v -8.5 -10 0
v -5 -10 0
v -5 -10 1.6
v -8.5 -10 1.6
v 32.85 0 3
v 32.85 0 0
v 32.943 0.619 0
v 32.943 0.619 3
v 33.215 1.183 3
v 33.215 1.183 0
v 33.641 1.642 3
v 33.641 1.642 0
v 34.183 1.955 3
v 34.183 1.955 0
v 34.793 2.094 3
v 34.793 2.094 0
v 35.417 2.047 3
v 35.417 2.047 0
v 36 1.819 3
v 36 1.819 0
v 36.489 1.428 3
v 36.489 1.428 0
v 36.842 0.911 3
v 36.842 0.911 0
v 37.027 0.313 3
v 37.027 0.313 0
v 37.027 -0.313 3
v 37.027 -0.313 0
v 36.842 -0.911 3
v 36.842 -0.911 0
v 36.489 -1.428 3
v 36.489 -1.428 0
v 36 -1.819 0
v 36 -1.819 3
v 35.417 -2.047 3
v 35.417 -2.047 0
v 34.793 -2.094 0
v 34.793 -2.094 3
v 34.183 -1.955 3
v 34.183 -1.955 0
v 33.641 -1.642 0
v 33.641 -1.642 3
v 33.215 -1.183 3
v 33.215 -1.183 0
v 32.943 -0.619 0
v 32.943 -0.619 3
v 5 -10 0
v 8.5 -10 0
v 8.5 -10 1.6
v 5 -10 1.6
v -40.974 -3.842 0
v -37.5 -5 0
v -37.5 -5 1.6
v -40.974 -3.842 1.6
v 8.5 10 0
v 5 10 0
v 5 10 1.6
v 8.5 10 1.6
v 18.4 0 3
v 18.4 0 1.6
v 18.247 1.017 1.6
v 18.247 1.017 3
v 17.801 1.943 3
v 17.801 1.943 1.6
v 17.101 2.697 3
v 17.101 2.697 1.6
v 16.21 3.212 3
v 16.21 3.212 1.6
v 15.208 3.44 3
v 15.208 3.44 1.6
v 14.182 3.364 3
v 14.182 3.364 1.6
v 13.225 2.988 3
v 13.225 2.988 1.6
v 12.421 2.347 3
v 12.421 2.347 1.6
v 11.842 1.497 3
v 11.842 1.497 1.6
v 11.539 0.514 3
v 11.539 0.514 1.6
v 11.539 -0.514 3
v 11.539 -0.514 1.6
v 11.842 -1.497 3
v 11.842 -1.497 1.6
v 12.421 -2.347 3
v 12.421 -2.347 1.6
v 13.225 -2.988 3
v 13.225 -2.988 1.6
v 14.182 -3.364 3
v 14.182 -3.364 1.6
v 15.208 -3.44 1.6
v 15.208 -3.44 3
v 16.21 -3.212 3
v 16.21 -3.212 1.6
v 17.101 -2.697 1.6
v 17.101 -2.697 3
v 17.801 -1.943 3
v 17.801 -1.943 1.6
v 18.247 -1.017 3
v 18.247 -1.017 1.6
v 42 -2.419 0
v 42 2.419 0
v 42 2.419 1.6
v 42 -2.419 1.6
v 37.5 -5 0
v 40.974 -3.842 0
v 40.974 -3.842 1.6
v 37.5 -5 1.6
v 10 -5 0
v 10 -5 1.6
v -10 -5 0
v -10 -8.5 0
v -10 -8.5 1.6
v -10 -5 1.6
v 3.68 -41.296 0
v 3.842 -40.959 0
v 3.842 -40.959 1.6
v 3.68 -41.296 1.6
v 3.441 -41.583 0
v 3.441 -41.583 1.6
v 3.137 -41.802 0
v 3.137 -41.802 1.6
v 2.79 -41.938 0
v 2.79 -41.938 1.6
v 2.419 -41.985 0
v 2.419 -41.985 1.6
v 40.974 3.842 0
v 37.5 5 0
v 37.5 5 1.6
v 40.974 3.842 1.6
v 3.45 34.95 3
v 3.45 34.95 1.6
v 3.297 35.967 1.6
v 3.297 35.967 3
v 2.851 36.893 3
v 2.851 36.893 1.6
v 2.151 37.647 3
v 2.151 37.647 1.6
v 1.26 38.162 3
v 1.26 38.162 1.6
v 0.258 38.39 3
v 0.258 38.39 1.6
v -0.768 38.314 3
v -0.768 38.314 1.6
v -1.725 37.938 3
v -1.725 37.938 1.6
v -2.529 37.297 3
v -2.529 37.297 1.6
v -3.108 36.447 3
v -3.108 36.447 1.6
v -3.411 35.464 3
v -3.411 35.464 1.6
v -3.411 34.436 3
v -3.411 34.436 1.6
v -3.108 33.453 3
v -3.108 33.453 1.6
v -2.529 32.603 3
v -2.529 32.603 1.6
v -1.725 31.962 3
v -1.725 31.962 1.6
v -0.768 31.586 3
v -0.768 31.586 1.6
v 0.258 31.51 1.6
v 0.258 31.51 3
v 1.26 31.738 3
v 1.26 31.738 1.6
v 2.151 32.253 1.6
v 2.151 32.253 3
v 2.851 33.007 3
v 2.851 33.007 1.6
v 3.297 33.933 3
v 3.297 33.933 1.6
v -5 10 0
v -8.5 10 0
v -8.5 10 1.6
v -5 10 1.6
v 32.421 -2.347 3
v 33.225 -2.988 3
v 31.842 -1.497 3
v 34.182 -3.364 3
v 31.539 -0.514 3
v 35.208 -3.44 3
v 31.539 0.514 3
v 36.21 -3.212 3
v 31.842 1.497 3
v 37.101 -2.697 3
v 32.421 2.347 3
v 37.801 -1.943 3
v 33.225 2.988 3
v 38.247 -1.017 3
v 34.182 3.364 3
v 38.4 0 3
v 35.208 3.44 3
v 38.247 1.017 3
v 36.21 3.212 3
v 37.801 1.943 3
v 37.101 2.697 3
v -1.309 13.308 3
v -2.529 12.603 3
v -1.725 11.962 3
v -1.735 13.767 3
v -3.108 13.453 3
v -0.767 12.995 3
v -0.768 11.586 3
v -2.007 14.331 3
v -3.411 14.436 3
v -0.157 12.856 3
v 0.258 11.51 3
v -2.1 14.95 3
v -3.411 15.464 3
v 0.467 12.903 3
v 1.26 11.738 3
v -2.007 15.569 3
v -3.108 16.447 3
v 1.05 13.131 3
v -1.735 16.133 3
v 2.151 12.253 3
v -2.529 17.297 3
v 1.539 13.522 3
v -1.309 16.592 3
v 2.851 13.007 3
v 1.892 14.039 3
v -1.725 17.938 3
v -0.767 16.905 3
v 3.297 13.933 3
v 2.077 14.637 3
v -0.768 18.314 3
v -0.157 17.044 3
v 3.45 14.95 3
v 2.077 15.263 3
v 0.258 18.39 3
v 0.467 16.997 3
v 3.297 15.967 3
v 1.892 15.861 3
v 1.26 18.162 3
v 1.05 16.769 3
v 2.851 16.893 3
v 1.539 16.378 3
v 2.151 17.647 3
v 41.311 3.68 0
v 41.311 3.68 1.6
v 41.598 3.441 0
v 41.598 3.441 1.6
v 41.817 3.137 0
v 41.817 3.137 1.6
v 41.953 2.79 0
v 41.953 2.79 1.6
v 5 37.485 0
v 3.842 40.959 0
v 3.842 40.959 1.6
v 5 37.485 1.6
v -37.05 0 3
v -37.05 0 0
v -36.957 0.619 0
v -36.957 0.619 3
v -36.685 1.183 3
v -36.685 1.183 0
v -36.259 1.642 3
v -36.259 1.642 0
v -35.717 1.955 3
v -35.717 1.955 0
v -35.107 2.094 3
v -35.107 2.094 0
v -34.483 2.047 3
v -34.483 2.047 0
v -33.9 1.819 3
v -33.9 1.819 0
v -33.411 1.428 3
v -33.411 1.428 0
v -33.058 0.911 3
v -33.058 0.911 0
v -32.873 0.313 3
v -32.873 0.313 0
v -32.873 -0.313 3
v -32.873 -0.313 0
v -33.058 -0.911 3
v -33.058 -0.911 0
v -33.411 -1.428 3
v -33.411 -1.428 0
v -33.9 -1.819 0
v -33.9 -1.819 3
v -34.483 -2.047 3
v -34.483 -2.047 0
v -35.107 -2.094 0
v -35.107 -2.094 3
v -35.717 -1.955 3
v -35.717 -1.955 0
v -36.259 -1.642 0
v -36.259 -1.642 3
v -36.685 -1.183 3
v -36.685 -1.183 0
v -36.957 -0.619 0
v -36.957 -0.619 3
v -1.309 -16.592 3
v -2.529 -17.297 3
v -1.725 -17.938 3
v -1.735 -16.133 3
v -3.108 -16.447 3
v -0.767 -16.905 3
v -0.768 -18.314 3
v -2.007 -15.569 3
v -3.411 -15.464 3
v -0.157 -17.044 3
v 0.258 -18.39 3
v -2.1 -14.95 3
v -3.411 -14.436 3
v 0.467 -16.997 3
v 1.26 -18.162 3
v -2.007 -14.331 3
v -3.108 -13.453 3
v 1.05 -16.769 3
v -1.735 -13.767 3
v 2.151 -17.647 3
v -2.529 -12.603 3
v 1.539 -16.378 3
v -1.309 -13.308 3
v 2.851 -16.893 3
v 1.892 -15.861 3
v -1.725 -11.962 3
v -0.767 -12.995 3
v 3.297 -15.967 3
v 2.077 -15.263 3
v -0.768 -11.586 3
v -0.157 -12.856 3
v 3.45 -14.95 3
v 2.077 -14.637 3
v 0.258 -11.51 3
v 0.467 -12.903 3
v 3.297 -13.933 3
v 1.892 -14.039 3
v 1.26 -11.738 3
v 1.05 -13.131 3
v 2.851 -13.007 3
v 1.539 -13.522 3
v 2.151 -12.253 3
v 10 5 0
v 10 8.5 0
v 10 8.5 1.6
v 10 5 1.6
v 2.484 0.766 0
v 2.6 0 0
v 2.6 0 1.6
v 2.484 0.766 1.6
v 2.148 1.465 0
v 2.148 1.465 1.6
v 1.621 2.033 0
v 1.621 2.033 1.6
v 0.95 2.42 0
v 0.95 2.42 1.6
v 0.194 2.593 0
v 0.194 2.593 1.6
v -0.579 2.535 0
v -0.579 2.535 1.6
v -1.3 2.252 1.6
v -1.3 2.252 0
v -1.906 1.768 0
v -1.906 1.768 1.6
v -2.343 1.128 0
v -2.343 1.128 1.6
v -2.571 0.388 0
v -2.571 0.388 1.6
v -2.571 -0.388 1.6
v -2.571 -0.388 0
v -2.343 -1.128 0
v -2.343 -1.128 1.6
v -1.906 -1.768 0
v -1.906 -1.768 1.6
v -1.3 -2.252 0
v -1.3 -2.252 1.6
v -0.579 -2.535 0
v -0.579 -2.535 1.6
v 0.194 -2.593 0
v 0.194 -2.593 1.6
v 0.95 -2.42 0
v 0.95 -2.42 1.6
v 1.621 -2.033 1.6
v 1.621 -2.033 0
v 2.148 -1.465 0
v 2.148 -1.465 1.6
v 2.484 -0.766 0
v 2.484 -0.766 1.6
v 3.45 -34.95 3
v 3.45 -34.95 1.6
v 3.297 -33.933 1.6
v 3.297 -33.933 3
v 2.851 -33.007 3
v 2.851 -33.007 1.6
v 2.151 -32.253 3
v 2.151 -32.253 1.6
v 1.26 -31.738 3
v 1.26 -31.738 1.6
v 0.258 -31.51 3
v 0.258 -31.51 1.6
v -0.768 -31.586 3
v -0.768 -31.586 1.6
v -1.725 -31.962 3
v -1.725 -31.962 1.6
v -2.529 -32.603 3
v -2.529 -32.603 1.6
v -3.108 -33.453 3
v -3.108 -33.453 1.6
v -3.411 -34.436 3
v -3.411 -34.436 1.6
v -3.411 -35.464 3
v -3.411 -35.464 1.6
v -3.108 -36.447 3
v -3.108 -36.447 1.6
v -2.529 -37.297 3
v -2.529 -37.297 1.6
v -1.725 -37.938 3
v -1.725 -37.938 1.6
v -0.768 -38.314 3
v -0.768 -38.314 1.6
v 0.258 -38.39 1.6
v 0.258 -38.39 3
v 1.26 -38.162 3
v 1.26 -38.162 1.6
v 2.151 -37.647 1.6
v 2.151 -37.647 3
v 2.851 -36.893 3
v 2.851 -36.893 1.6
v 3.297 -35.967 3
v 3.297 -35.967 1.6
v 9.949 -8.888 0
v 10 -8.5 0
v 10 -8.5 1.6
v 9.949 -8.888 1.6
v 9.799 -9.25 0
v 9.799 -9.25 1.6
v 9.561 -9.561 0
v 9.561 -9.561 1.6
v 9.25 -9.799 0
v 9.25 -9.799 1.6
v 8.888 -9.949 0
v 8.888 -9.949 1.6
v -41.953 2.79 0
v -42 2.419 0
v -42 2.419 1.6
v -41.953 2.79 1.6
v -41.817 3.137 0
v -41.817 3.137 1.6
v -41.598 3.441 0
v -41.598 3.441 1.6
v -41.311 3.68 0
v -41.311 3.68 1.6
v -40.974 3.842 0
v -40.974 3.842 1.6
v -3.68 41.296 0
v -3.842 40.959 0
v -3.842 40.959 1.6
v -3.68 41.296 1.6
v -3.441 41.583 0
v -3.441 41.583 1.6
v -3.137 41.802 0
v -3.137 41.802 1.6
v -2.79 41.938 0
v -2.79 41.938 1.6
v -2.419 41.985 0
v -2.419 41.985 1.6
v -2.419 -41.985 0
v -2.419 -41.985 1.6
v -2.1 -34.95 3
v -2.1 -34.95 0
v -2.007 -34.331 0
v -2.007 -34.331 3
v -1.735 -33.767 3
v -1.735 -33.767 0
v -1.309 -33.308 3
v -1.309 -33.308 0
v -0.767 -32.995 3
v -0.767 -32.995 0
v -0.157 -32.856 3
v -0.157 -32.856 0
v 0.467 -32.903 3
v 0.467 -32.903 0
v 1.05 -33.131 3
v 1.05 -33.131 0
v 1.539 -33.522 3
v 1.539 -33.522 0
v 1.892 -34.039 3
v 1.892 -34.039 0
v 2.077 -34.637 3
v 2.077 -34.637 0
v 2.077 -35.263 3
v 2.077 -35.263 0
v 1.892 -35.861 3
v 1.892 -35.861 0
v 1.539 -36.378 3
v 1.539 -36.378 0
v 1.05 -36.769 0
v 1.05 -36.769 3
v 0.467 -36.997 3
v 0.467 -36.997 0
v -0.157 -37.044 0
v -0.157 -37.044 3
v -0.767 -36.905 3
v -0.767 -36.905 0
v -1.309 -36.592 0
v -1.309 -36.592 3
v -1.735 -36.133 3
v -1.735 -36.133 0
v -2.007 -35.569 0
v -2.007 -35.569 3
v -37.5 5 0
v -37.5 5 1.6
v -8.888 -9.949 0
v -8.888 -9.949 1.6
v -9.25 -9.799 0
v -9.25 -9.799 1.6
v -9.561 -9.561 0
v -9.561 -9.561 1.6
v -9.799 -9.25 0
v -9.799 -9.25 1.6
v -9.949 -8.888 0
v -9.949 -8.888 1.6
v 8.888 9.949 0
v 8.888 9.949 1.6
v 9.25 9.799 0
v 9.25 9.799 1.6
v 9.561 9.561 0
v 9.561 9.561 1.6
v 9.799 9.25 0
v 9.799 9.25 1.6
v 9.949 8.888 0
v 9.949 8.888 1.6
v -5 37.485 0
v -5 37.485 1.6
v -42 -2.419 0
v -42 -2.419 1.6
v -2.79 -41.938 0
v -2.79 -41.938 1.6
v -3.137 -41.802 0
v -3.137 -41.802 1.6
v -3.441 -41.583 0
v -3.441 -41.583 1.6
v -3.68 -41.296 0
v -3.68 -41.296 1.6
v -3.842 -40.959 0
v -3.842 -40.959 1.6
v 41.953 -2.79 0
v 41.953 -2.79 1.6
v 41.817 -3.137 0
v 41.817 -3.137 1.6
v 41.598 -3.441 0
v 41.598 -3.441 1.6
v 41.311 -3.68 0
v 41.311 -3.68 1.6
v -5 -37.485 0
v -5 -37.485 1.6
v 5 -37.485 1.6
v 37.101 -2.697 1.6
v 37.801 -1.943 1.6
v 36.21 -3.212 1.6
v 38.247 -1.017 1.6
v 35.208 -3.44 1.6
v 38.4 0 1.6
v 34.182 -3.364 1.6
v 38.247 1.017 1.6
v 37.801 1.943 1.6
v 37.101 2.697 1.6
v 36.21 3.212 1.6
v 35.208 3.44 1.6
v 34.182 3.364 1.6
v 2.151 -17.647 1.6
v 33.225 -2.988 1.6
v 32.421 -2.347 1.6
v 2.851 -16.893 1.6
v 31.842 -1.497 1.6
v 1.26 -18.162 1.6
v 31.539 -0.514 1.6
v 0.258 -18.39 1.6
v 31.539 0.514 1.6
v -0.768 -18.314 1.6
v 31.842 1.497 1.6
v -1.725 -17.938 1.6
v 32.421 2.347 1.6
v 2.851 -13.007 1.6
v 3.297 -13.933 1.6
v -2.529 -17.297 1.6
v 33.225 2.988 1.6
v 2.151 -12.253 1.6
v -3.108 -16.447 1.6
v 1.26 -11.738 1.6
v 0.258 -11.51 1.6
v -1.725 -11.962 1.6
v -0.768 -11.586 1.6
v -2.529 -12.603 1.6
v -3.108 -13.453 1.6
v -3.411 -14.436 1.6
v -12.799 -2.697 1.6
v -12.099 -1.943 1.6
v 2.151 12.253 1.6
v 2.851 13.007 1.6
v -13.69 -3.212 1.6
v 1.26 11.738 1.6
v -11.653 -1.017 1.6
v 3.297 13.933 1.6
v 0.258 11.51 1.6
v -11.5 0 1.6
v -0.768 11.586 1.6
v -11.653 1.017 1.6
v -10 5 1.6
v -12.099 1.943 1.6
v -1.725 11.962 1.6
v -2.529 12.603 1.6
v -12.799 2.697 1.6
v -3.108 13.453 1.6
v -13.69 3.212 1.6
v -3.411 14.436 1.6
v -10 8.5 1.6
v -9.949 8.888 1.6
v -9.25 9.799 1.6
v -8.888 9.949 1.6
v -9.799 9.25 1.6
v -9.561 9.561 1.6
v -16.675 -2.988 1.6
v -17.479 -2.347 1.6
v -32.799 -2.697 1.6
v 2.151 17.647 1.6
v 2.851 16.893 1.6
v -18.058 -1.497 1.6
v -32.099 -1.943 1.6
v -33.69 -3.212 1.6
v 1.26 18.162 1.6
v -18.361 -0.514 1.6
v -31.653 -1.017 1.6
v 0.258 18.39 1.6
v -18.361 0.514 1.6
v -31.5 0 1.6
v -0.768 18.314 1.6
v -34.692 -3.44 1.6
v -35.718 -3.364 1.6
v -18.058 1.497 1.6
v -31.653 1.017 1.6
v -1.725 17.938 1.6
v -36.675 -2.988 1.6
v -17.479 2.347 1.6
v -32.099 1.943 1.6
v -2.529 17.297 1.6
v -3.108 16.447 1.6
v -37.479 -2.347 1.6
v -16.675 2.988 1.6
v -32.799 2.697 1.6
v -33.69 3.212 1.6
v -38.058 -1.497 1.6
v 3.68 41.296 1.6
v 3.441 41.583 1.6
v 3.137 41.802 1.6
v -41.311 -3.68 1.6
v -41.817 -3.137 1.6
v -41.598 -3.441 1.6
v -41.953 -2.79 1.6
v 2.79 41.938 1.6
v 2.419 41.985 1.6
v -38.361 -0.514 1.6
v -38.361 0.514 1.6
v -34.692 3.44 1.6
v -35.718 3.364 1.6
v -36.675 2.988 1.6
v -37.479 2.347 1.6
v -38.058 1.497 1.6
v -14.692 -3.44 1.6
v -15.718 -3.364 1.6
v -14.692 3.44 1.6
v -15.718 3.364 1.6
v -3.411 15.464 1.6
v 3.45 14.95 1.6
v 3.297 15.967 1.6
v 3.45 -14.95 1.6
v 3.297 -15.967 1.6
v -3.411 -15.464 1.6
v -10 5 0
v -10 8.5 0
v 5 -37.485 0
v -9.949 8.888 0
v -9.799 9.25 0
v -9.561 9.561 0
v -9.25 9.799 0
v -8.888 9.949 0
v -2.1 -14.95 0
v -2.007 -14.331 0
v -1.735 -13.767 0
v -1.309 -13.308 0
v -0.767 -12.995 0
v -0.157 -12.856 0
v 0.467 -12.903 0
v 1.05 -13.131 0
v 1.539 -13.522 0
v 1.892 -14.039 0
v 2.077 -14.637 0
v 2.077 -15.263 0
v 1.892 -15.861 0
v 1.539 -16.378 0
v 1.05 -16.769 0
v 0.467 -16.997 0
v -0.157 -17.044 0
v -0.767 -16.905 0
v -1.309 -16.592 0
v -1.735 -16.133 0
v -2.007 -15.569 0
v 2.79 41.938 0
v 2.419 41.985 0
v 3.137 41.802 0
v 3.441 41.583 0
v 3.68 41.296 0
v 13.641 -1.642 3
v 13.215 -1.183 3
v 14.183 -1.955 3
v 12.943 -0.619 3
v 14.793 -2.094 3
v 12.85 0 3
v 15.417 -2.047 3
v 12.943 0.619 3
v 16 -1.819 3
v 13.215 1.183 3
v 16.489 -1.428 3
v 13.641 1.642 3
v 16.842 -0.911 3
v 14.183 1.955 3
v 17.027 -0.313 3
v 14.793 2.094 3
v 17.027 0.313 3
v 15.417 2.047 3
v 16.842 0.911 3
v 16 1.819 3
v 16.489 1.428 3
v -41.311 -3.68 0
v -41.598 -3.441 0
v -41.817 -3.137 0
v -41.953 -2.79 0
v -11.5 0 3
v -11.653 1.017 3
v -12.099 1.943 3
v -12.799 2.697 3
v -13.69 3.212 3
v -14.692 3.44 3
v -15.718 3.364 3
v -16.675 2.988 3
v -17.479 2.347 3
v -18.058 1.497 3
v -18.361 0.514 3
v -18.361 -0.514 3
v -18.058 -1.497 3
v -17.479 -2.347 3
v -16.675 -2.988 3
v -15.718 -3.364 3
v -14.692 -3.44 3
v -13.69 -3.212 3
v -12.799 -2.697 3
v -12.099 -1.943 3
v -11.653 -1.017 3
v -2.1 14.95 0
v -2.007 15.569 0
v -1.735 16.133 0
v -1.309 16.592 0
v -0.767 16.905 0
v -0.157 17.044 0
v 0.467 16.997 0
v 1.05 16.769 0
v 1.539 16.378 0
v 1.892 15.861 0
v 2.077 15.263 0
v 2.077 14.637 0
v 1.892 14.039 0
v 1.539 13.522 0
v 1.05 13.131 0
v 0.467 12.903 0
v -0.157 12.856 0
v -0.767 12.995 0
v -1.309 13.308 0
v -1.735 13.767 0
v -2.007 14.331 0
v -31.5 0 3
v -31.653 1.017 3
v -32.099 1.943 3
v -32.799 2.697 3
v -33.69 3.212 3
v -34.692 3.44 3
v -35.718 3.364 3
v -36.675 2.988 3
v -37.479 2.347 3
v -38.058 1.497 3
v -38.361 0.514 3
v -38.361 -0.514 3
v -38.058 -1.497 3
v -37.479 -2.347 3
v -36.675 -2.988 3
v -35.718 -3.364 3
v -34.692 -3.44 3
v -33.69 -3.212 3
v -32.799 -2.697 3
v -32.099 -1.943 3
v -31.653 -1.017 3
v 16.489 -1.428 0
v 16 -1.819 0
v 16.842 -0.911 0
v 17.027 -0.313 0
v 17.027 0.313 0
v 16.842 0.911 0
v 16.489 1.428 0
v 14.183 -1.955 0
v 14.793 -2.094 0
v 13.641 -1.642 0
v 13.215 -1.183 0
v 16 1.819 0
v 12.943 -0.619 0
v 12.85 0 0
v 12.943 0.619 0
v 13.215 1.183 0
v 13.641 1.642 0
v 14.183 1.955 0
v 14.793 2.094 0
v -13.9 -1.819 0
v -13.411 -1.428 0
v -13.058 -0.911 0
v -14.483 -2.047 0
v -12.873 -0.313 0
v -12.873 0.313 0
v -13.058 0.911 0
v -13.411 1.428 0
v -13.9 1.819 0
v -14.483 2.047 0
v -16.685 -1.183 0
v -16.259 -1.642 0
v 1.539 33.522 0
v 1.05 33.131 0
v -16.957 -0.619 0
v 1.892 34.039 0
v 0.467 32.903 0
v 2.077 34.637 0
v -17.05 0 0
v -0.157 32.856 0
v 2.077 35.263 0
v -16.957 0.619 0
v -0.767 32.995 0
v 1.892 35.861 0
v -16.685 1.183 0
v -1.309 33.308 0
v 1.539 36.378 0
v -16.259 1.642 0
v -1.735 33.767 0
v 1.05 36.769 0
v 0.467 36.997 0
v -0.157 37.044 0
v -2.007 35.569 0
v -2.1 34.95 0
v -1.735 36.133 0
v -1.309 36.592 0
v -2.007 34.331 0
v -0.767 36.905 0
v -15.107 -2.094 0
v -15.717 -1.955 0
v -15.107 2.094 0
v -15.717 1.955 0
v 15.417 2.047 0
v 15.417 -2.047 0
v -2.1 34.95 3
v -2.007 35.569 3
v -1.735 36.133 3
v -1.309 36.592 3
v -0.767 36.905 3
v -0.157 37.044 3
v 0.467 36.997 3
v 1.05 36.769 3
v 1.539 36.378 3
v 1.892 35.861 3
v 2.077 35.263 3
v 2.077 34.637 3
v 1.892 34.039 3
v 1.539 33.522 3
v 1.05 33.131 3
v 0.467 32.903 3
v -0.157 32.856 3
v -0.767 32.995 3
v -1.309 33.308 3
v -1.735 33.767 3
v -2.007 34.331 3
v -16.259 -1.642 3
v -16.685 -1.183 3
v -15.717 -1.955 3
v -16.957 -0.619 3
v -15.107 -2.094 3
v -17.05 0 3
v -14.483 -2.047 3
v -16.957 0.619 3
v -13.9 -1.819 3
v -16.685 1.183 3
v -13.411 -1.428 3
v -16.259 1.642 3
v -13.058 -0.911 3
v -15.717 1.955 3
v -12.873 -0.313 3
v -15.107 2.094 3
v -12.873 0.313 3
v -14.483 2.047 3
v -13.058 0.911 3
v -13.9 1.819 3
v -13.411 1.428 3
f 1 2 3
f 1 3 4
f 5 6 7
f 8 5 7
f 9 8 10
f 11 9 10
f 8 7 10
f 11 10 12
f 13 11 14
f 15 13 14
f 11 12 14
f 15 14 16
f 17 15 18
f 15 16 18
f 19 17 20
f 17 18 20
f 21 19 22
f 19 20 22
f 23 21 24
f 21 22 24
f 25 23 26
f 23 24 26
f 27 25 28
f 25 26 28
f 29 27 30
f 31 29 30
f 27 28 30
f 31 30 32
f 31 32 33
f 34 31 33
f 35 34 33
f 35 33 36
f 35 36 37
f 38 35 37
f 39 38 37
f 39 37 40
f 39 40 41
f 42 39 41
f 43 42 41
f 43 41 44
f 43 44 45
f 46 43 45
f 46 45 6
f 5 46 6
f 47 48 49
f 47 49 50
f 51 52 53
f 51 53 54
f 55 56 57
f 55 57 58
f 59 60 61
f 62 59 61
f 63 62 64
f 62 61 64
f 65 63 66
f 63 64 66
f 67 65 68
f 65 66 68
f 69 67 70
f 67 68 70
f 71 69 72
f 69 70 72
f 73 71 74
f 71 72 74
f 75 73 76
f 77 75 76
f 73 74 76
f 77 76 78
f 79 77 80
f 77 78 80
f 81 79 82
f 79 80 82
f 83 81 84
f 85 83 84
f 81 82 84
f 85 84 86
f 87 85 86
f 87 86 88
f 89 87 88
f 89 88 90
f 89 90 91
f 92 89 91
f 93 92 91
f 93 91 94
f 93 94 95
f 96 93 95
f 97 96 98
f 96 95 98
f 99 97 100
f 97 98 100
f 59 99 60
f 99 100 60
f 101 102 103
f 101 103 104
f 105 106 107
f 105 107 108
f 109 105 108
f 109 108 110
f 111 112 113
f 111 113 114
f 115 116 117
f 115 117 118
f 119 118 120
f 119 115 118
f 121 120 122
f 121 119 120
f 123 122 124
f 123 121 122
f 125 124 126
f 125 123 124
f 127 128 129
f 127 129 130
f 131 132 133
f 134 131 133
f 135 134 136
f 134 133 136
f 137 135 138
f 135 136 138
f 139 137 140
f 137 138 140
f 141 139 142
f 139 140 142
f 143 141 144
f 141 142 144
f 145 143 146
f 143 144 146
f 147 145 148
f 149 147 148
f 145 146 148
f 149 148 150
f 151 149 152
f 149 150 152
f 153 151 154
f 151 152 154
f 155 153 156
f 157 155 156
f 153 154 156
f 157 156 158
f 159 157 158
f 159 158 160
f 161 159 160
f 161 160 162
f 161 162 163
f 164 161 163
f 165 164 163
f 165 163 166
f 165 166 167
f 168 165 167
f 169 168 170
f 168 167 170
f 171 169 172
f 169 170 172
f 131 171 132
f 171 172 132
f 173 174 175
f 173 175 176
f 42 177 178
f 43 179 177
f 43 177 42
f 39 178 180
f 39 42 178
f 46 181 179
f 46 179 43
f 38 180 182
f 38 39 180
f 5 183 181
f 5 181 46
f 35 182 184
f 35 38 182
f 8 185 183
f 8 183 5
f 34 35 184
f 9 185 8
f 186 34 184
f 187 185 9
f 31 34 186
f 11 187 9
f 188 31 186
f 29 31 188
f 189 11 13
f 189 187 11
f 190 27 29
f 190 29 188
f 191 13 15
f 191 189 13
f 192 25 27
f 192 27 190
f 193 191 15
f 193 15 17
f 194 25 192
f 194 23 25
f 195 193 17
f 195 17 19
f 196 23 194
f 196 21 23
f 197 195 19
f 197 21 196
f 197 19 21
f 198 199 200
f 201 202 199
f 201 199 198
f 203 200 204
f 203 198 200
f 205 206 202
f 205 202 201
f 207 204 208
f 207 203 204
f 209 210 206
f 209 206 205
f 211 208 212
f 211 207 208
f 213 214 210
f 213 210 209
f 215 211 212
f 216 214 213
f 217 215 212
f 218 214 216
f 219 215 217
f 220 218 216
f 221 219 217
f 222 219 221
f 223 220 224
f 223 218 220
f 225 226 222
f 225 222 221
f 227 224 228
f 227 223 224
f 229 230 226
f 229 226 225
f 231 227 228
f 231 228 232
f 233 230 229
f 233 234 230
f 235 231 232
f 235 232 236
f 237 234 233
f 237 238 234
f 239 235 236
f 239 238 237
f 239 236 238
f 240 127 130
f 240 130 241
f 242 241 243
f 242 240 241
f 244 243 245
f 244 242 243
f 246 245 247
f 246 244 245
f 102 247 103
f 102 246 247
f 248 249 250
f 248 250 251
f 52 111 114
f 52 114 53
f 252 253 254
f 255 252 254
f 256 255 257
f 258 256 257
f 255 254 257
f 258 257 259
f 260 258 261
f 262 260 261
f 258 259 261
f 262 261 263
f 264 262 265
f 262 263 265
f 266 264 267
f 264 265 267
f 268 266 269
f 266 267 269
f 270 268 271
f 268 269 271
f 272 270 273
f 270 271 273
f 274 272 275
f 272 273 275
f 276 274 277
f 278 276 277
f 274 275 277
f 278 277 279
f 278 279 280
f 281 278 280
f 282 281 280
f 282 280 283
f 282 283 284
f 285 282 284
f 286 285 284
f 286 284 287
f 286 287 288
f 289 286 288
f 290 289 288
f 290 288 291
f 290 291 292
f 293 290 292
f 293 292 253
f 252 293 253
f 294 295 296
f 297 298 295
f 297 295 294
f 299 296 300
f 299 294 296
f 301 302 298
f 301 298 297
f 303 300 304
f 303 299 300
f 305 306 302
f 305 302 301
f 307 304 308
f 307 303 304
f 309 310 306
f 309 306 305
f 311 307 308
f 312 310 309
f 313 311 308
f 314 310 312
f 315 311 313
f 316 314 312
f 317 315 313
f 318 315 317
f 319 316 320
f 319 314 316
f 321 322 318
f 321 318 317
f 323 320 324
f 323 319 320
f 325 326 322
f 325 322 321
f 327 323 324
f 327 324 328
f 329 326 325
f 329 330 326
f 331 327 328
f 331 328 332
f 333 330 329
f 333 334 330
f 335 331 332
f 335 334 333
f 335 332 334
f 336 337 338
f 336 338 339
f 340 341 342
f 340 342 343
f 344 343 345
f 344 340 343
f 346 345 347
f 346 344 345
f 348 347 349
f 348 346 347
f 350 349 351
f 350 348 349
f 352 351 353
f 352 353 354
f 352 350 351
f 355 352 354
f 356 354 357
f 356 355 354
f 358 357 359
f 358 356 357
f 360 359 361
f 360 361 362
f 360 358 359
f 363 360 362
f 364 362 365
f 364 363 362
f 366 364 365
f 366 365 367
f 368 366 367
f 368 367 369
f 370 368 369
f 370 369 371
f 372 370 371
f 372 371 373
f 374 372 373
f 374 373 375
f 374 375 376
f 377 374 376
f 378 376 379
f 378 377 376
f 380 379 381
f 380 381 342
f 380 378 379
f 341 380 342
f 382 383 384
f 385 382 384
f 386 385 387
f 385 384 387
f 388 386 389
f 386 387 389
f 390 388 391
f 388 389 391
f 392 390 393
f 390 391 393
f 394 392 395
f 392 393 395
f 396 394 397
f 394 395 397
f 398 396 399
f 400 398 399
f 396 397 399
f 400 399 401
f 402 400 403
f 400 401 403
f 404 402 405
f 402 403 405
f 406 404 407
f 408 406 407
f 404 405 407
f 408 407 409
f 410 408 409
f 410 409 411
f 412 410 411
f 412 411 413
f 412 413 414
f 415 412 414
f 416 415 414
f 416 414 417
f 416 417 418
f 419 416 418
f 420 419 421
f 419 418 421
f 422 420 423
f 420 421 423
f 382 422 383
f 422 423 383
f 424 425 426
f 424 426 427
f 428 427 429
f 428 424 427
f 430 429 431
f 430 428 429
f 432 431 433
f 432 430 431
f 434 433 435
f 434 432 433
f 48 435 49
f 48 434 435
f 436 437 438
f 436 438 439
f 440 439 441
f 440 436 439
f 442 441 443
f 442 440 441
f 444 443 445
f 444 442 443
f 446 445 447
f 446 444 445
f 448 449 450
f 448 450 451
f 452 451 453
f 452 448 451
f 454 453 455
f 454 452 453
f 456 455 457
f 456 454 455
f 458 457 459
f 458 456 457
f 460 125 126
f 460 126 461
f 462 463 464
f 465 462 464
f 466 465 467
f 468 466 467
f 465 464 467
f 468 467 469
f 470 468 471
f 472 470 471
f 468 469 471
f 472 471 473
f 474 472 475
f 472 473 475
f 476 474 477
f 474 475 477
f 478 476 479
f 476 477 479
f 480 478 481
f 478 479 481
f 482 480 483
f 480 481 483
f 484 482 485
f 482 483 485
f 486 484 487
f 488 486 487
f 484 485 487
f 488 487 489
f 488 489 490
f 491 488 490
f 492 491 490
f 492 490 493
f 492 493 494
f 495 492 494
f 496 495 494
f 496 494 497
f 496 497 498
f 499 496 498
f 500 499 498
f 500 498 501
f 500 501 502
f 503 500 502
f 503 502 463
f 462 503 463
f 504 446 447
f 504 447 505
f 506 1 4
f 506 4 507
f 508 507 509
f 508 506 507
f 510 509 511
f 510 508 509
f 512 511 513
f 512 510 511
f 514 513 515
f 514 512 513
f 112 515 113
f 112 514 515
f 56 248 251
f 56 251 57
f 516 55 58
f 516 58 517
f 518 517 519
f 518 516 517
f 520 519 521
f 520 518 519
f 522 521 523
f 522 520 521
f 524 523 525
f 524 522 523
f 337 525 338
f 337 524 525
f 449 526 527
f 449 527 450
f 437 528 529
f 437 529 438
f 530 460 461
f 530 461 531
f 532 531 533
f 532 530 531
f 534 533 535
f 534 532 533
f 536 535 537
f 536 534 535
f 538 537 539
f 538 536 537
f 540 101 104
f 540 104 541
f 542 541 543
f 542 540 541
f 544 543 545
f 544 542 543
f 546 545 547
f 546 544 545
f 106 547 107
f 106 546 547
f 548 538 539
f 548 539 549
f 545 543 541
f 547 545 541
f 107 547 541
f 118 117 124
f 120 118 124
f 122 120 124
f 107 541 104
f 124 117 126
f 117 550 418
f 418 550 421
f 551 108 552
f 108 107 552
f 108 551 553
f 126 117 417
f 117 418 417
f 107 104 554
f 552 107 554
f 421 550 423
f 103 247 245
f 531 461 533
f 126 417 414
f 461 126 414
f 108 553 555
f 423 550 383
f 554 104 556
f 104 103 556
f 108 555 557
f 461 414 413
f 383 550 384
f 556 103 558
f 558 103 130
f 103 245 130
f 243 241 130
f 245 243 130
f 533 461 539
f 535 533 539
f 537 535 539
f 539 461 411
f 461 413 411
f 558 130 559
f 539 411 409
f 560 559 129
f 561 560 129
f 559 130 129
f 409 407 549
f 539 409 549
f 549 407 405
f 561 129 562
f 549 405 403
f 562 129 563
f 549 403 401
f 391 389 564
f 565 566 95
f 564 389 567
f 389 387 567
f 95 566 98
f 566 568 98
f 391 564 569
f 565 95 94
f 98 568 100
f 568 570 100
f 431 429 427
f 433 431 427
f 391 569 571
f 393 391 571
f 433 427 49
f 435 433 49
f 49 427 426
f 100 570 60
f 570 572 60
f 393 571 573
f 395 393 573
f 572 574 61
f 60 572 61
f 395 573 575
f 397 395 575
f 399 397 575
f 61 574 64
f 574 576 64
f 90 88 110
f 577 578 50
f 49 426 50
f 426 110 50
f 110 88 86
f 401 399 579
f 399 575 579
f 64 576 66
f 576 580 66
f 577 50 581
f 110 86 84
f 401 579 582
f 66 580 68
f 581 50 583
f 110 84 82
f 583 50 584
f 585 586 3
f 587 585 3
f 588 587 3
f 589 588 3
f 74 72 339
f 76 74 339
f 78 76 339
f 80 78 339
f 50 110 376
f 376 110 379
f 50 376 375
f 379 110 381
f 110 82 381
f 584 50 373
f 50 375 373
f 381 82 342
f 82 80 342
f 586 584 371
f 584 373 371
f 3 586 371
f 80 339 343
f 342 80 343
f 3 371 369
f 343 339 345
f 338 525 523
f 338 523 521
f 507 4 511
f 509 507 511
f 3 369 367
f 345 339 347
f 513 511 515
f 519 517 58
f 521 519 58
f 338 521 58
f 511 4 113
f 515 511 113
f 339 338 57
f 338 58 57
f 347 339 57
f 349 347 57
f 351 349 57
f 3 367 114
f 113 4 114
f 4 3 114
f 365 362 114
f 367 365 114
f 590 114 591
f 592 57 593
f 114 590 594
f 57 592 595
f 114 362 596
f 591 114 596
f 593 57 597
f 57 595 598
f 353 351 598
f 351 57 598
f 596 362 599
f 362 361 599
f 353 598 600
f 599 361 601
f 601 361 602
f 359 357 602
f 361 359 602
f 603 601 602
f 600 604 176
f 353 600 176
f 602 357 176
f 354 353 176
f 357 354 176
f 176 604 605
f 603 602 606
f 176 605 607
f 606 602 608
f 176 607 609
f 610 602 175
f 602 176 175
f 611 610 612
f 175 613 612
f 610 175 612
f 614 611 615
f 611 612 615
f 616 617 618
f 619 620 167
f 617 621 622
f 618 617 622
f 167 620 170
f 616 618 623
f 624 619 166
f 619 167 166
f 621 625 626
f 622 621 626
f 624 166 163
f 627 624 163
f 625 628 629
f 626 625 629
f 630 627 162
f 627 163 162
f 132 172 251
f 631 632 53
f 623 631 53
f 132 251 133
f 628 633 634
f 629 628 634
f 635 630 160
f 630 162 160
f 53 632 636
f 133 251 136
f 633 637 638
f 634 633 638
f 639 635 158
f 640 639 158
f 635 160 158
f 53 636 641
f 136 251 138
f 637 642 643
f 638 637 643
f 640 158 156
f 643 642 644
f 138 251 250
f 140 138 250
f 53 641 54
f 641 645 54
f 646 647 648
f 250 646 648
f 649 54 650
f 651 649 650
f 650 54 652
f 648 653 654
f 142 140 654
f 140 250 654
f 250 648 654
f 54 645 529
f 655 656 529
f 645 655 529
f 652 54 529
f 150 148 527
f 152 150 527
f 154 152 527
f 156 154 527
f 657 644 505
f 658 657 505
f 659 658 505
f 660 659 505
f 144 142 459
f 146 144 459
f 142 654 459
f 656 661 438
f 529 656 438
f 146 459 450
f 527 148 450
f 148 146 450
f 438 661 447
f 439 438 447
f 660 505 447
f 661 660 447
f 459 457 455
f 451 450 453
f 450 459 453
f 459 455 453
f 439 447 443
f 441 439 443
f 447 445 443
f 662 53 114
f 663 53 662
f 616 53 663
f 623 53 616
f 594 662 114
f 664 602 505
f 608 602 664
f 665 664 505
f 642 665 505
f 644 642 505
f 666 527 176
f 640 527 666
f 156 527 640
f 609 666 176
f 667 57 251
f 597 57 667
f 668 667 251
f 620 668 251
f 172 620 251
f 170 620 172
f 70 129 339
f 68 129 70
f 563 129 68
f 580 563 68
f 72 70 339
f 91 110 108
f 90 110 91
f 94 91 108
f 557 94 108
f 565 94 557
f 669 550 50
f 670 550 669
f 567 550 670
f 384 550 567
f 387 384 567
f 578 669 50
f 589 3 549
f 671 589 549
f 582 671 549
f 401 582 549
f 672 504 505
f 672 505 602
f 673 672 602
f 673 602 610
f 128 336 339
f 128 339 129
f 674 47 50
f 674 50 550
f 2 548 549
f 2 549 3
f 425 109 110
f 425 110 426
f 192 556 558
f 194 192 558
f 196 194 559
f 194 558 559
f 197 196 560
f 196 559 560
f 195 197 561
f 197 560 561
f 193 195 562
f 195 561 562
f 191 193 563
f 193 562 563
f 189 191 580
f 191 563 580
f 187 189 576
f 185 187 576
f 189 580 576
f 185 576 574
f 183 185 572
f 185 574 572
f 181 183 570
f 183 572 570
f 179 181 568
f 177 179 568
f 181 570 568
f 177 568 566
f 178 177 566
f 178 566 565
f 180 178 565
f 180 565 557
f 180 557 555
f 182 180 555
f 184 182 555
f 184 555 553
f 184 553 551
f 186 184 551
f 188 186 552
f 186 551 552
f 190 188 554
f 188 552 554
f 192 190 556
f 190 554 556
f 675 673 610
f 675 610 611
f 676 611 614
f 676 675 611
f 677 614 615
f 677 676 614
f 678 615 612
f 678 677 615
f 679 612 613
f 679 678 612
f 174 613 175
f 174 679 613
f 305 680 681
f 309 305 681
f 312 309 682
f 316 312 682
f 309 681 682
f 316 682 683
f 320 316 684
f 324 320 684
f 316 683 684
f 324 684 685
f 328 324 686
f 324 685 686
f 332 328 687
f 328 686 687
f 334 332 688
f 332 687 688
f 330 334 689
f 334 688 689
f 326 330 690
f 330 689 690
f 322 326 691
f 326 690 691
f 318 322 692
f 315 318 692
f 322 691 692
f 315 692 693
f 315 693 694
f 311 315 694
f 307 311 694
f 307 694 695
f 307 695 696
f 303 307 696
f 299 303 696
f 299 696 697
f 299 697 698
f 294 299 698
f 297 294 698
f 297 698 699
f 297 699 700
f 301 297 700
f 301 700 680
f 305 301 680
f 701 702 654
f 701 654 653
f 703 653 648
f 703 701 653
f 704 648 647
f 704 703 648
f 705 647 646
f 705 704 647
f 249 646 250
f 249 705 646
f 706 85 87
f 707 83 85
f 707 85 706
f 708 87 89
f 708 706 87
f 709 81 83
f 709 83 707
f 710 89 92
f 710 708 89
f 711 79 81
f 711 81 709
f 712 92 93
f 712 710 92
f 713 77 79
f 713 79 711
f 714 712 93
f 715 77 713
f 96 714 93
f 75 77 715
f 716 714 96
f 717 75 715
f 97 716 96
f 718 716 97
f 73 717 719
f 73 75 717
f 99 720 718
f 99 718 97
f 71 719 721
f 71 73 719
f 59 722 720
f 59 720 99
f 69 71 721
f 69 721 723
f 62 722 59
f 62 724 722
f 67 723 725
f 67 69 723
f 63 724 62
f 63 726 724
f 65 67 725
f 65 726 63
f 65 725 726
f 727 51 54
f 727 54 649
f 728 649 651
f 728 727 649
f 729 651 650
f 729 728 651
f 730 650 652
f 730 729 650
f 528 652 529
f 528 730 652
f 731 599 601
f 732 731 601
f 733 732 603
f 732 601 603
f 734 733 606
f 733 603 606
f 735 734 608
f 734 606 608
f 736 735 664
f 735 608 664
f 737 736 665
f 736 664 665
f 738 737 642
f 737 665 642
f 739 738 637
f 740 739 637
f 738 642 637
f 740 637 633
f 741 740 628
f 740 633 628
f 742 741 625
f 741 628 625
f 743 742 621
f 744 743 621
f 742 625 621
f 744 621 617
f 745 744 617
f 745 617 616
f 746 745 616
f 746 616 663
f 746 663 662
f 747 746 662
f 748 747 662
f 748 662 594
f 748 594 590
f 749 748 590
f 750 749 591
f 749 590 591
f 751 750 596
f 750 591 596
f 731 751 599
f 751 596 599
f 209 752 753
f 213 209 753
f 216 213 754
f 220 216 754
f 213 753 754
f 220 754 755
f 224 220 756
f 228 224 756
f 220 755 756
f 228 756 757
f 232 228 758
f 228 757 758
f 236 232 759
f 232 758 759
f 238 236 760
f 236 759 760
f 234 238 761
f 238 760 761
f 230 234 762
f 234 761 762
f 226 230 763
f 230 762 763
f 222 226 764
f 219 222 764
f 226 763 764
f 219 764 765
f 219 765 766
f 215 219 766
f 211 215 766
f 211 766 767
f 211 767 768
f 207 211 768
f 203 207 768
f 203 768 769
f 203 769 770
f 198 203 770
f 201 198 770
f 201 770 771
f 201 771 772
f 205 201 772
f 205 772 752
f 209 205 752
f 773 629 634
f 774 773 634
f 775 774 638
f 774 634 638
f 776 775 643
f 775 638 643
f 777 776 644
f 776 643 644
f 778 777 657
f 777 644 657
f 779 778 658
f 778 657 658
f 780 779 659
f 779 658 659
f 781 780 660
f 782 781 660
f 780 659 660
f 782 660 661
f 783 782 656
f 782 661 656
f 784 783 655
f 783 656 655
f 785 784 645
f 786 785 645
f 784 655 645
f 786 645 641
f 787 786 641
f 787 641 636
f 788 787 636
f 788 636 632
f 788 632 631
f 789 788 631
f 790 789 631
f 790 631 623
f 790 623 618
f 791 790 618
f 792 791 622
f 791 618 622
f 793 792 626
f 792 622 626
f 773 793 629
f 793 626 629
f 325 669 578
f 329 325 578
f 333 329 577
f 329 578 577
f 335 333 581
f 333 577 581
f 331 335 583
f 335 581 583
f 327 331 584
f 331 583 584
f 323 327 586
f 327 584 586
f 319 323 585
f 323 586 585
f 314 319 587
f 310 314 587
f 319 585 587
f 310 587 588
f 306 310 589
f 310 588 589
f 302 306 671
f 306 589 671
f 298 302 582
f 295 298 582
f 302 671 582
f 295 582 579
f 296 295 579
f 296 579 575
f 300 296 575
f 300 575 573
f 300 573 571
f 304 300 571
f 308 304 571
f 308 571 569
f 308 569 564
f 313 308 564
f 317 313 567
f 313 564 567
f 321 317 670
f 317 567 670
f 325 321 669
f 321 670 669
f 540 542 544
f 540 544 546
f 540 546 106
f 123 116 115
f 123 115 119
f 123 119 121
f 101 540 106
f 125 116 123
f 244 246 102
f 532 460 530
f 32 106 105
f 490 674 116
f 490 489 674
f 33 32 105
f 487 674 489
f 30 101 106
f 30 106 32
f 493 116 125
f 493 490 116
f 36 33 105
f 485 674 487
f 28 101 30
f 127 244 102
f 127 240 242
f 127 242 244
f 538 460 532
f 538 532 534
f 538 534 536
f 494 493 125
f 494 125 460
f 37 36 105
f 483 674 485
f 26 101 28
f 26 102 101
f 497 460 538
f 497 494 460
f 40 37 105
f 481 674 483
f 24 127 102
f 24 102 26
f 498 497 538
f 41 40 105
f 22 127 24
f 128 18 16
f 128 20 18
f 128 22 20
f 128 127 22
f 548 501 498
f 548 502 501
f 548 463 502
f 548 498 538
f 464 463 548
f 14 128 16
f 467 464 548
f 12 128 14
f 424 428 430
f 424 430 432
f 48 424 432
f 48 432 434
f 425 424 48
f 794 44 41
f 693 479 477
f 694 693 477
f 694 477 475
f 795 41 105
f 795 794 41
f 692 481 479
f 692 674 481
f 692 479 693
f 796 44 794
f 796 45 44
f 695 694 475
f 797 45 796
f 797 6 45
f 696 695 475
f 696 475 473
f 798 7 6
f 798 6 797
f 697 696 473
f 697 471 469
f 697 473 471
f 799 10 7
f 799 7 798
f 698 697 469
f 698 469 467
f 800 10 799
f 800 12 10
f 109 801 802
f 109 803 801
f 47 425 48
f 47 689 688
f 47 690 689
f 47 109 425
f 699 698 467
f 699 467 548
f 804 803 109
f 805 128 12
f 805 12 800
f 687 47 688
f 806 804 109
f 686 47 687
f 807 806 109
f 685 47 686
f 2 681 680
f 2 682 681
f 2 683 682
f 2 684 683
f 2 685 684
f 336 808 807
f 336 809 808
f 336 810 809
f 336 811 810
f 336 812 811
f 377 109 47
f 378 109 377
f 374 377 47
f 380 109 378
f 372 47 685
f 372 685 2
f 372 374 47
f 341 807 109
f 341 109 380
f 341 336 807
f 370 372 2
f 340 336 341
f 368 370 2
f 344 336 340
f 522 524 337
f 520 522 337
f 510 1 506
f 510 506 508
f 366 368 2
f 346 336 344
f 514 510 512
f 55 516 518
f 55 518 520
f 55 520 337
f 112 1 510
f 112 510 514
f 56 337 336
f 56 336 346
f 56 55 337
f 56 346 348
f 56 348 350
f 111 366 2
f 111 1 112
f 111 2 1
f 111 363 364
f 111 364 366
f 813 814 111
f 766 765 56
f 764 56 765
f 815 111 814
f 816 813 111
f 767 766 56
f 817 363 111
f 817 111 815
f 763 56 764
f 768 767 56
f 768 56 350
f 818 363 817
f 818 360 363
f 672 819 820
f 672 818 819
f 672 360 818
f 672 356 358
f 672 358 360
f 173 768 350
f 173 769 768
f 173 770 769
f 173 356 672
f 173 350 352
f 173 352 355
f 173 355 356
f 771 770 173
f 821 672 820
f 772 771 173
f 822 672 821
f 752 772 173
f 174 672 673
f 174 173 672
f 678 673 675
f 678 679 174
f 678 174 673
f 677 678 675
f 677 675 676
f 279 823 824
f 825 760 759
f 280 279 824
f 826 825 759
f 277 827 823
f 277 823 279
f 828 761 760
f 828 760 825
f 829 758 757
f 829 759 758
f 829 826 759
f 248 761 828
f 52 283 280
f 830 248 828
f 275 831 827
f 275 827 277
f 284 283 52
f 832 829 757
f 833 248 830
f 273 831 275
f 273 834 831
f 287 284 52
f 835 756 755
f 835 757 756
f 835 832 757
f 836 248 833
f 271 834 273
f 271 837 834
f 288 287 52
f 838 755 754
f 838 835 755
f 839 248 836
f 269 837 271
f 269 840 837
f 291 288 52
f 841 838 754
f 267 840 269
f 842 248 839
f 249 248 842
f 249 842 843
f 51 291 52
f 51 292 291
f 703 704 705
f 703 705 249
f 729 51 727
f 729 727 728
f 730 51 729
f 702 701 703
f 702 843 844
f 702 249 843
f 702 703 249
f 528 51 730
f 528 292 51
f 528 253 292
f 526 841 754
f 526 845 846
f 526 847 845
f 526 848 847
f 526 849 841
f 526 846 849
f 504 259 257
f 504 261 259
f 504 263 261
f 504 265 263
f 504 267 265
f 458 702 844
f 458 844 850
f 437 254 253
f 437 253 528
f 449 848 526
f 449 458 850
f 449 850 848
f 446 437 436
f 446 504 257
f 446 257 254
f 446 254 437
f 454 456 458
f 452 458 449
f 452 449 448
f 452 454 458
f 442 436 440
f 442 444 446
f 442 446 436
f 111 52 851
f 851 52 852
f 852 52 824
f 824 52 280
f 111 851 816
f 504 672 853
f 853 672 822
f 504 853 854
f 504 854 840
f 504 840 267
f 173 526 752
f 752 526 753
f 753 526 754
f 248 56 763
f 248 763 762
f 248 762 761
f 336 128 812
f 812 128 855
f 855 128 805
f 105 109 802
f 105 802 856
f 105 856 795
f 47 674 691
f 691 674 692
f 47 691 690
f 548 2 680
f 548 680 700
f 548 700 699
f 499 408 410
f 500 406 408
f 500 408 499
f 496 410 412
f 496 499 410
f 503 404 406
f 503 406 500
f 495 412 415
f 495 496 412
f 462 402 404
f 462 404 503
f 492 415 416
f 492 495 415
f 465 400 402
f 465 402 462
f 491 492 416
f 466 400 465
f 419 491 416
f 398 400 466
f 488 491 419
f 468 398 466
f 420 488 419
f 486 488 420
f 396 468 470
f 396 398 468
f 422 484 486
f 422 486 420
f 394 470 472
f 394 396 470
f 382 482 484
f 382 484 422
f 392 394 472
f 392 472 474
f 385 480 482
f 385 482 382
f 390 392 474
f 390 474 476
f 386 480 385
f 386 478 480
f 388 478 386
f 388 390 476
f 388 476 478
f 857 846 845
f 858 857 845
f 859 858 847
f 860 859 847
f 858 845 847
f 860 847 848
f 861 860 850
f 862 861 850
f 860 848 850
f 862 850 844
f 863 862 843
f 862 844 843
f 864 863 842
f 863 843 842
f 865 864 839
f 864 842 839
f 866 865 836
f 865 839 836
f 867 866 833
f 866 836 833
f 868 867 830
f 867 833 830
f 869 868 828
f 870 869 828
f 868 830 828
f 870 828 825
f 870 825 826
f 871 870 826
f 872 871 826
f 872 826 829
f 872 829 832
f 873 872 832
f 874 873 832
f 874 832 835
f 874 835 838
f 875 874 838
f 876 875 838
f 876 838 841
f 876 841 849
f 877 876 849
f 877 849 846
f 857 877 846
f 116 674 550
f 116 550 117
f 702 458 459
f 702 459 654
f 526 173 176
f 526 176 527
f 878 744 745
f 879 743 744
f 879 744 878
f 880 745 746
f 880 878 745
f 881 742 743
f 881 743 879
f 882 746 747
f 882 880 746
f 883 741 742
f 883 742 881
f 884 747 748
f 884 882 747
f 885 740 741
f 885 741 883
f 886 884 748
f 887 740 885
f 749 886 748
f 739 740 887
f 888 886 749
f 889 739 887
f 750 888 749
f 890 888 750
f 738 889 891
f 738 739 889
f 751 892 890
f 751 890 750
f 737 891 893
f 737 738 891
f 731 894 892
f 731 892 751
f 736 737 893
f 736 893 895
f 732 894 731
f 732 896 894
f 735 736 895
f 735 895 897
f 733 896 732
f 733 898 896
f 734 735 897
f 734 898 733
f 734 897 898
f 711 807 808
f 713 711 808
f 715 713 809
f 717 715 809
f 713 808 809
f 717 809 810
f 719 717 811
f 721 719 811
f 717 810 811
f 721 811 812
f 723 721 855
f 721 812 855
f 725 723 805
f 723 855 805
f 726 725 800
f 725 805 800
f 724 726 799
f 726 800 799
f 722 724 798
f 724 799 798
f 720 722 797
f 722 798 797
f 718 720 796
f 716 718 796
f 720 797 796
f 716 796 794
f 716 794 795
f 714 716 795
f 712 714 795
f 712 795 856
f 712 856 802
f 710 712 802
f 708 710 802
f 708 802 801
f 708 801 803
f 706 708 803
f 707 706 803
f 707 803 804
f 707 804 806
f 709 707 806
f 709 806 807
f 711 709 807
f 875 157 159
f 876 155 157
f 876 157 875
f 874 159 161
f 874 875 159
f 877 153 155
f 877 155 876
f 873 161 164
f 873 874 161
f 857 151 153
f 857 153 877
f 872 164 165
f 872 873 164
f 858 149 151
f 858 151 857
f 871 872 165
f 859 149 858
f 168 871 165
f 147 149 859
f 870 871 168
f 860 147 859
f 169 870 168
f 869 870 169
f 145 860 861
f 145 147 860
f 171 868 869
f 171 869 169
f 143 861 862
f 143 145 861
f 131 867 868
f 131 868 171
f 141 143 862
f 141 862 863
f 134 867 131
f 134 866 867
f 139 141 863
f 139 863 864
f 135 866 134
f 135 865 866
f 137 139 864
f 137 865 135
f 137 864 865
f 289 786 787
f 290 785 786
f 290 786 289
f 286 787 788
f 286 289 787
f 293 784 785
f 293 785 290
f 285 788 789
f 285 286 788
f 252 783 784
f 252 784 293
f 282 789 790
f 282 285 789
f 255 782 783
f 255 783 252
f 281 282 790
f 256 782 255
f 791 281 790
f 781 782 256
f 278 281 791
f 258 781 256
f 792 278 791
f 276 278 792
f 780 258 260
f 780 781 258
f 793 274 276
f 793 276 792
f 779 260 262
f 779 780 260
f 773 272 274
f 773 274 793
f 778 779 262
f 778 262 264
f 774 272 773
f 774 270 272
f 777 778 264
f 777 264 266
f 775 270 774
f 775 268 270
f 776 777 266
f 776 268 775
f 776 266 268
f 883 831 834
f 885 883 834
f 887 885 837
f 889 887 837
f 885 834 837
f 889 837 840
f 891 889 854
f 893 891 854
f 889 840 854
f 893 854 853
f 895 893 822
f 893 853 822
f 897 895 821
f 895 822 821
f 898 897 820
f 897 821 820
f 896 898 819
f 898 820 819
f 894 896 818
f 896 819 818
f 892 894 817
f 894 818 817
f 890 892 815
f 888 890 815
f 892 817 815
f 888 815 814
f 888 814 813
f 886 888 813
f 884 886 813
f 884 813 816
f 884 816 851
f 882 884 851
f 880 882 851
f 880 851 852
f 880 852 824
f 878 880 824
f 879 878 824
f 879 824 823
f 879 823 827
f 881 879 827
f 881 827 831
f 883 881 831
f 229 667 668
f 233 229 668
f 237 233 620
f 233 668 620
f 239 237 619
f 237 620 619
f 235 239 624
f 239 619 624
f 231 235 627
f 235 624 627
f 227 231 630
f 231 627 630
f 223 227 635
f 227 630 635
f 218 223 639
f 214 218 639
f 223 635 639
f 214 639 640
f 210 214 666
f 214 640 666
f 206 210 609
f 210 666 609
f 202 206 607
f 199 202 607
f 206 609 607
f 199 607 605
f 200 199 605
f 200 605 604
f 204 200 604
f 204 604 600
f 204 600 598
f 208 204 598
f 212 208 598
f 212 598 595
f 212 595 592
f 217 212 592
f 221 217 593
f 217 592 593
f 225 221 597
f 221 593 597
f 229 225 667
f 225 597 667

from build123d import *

# Parameters (mm, degrees)
SKETCH1_R             = 2.6
BOSS_EXTRUDE1_DEPTH   = 1.6
SKETCH2_R             = 3.45
BOSS_EXTRUDE2_DEPTH   = 1.4
M5X0_8_TAPPED_HOLE1_D = 4.2


with BuildPart() as part:
    # Sketch1 → Boss-Extrude1 (new body)
    with BuildSketch(Plane.XY):
        with BuildLine():
            Line((-10, -8.5), (-10, -5))
            Line((-10, -5), (-37.5, -5))
            Line((-37.5, -5), (-40.974341649, -3.841886117))
            ThreePointArc((-40.974341649, -3.841886117), (-41.716863278, -3.295926597), (-42, -2.41886117))
            Line((-42, -2.41886117), (-42, 2.41886117))
            ThreePointArc((-42, 2.41886117), (-41.716863278, 3.295926597), (-40.974341649, 3.841886117))
            Line((-40.974341649, 3.841886117), (-37.5, 5))
            Line((-37.5, 5), (-10, 5))
            Line((-10, 5), (-10, 8.5))
            ThreePointArc((-10, 8.5), (-9.560660172, 9.560660172), (-8.5, 10))
            Line((-8.5, 10), (-5, 10))
            Line((-5, 10), (-5, 37.485))
            Line((-5, 37.485), (-3.841886117, 40.959341649))
            ThreePointArc((-3.841886117, 40.959341649), (-3.295926597, 41.701863278), (-2.41886117, 41.985))
            Line((-2.41886117, 41.985), (2.41886117, 41.985))
            ThreePointArc((2.41886117, 41.985), (3.295926597, 41.701863278), (3.841886117, 40.959341649))
            Line((3.841886117, 40.959341649), (5, 37.485))
            Line((5, 37.485), (5, 10))
            Line((5, 10), (8.5, 10))
            ThreePointArc((8.5, 10), (9.560660172, 9.560660172), (10, 8.5))
            Line((10, 8.5), (10, 5))
            Line((10, 5), (37.5, 5))
            Line((37.5, 5), (40.974341649, 3.841886117))
            ThreePointArc((40.974341649, 3.841886117), (41.716863278, 3.295926597), (42, 2.41886117))
            Line((42, 2.41886117), (42, -2.41886117))
            ThreePointArc((42, -2.41886117), (41.716863278, -3.295926597), (40.974341649, -3.841886117))
            Line((40.974341649, -3.841886117), (37.5, -5))
            Line((37.5, -5), (10, -5))
            Line((10, -5), (10, -8.5))
            ThreePointArc((10, -8.5), (9.560660172, -9.560660172), (8.5, -10))
            Line((8.5, -10), (5, -10))
            Line((5, -10), (5, -37.485))
            Line((5, -37.485), (3.841886117, -40.959341649))
            ThreePointArc((3.841886117, -40.959341649), (3.295926597, -41.701863278), (2.41886117, -41.985))
            Line((2.41886117, -41.985), (-2.41886117, -41.985))
            ThreePointArc((-2.41886117, -41.985), (-3.295926597, -41.701863278), (-3.841886117, -40.959341649))
            Line((-3.841886117, -40.959341649), (-5, -37.485))
            Line((-5, -37.485), (-5, -10))
            Line((-5, -10), (-8.5, -10))
            ThreePointArc((-8.5, -10), (-9.560660172, -9.560660172), (-10, -8.5))
        make_face()
        Circle(SKETCH1_R, mode=Mode.SUBTRACT)
    extrude(amount=BOSS_EXTRUDE1_DEPTH)

    # Sketch2 → Boss-Extrude2 (add)
    with BuildSketch(Plane.XY.offset(1.6)):
        with Locations((0, 14.95)):
            Circle(SKETCH2_R)
        with Locations((0, 34.95)):
            Circle(SKETCH2_R)
        with Locations((0, -14.95)):
            Circle(SKETCH2_R)
        with Locations((0, -34.95)):
            Circle(SKETCH2_R)
        with Locations((-14.95, 0)):
            Circle(SKETCH2_R)
        with Locations((-34.95, 0)):
            Circle(SKETCH2_R)
        with Locations((14.95, 0)):
            Circle(SKETCH2_R)
        with Locations((34.95, 0)):
            Circle(SKETCH2_R)
    extrude(amount=BOSS_EXTRUDE2_DEPTH)

    # M5x0.8 Tapped Hole1 (through all)
    with Locations(Plane.XY.offset(3)):
        with Locations((0, 34.95), (0, 14.95), (0, -14.95), (0, -34.95), (-14.95, 0), (-34.95, 0), (14.95, 0), (34.95, 0)):
            Hole(M5X0_8_TAPPED_HOLE1_D / 2)


solid = part.part
